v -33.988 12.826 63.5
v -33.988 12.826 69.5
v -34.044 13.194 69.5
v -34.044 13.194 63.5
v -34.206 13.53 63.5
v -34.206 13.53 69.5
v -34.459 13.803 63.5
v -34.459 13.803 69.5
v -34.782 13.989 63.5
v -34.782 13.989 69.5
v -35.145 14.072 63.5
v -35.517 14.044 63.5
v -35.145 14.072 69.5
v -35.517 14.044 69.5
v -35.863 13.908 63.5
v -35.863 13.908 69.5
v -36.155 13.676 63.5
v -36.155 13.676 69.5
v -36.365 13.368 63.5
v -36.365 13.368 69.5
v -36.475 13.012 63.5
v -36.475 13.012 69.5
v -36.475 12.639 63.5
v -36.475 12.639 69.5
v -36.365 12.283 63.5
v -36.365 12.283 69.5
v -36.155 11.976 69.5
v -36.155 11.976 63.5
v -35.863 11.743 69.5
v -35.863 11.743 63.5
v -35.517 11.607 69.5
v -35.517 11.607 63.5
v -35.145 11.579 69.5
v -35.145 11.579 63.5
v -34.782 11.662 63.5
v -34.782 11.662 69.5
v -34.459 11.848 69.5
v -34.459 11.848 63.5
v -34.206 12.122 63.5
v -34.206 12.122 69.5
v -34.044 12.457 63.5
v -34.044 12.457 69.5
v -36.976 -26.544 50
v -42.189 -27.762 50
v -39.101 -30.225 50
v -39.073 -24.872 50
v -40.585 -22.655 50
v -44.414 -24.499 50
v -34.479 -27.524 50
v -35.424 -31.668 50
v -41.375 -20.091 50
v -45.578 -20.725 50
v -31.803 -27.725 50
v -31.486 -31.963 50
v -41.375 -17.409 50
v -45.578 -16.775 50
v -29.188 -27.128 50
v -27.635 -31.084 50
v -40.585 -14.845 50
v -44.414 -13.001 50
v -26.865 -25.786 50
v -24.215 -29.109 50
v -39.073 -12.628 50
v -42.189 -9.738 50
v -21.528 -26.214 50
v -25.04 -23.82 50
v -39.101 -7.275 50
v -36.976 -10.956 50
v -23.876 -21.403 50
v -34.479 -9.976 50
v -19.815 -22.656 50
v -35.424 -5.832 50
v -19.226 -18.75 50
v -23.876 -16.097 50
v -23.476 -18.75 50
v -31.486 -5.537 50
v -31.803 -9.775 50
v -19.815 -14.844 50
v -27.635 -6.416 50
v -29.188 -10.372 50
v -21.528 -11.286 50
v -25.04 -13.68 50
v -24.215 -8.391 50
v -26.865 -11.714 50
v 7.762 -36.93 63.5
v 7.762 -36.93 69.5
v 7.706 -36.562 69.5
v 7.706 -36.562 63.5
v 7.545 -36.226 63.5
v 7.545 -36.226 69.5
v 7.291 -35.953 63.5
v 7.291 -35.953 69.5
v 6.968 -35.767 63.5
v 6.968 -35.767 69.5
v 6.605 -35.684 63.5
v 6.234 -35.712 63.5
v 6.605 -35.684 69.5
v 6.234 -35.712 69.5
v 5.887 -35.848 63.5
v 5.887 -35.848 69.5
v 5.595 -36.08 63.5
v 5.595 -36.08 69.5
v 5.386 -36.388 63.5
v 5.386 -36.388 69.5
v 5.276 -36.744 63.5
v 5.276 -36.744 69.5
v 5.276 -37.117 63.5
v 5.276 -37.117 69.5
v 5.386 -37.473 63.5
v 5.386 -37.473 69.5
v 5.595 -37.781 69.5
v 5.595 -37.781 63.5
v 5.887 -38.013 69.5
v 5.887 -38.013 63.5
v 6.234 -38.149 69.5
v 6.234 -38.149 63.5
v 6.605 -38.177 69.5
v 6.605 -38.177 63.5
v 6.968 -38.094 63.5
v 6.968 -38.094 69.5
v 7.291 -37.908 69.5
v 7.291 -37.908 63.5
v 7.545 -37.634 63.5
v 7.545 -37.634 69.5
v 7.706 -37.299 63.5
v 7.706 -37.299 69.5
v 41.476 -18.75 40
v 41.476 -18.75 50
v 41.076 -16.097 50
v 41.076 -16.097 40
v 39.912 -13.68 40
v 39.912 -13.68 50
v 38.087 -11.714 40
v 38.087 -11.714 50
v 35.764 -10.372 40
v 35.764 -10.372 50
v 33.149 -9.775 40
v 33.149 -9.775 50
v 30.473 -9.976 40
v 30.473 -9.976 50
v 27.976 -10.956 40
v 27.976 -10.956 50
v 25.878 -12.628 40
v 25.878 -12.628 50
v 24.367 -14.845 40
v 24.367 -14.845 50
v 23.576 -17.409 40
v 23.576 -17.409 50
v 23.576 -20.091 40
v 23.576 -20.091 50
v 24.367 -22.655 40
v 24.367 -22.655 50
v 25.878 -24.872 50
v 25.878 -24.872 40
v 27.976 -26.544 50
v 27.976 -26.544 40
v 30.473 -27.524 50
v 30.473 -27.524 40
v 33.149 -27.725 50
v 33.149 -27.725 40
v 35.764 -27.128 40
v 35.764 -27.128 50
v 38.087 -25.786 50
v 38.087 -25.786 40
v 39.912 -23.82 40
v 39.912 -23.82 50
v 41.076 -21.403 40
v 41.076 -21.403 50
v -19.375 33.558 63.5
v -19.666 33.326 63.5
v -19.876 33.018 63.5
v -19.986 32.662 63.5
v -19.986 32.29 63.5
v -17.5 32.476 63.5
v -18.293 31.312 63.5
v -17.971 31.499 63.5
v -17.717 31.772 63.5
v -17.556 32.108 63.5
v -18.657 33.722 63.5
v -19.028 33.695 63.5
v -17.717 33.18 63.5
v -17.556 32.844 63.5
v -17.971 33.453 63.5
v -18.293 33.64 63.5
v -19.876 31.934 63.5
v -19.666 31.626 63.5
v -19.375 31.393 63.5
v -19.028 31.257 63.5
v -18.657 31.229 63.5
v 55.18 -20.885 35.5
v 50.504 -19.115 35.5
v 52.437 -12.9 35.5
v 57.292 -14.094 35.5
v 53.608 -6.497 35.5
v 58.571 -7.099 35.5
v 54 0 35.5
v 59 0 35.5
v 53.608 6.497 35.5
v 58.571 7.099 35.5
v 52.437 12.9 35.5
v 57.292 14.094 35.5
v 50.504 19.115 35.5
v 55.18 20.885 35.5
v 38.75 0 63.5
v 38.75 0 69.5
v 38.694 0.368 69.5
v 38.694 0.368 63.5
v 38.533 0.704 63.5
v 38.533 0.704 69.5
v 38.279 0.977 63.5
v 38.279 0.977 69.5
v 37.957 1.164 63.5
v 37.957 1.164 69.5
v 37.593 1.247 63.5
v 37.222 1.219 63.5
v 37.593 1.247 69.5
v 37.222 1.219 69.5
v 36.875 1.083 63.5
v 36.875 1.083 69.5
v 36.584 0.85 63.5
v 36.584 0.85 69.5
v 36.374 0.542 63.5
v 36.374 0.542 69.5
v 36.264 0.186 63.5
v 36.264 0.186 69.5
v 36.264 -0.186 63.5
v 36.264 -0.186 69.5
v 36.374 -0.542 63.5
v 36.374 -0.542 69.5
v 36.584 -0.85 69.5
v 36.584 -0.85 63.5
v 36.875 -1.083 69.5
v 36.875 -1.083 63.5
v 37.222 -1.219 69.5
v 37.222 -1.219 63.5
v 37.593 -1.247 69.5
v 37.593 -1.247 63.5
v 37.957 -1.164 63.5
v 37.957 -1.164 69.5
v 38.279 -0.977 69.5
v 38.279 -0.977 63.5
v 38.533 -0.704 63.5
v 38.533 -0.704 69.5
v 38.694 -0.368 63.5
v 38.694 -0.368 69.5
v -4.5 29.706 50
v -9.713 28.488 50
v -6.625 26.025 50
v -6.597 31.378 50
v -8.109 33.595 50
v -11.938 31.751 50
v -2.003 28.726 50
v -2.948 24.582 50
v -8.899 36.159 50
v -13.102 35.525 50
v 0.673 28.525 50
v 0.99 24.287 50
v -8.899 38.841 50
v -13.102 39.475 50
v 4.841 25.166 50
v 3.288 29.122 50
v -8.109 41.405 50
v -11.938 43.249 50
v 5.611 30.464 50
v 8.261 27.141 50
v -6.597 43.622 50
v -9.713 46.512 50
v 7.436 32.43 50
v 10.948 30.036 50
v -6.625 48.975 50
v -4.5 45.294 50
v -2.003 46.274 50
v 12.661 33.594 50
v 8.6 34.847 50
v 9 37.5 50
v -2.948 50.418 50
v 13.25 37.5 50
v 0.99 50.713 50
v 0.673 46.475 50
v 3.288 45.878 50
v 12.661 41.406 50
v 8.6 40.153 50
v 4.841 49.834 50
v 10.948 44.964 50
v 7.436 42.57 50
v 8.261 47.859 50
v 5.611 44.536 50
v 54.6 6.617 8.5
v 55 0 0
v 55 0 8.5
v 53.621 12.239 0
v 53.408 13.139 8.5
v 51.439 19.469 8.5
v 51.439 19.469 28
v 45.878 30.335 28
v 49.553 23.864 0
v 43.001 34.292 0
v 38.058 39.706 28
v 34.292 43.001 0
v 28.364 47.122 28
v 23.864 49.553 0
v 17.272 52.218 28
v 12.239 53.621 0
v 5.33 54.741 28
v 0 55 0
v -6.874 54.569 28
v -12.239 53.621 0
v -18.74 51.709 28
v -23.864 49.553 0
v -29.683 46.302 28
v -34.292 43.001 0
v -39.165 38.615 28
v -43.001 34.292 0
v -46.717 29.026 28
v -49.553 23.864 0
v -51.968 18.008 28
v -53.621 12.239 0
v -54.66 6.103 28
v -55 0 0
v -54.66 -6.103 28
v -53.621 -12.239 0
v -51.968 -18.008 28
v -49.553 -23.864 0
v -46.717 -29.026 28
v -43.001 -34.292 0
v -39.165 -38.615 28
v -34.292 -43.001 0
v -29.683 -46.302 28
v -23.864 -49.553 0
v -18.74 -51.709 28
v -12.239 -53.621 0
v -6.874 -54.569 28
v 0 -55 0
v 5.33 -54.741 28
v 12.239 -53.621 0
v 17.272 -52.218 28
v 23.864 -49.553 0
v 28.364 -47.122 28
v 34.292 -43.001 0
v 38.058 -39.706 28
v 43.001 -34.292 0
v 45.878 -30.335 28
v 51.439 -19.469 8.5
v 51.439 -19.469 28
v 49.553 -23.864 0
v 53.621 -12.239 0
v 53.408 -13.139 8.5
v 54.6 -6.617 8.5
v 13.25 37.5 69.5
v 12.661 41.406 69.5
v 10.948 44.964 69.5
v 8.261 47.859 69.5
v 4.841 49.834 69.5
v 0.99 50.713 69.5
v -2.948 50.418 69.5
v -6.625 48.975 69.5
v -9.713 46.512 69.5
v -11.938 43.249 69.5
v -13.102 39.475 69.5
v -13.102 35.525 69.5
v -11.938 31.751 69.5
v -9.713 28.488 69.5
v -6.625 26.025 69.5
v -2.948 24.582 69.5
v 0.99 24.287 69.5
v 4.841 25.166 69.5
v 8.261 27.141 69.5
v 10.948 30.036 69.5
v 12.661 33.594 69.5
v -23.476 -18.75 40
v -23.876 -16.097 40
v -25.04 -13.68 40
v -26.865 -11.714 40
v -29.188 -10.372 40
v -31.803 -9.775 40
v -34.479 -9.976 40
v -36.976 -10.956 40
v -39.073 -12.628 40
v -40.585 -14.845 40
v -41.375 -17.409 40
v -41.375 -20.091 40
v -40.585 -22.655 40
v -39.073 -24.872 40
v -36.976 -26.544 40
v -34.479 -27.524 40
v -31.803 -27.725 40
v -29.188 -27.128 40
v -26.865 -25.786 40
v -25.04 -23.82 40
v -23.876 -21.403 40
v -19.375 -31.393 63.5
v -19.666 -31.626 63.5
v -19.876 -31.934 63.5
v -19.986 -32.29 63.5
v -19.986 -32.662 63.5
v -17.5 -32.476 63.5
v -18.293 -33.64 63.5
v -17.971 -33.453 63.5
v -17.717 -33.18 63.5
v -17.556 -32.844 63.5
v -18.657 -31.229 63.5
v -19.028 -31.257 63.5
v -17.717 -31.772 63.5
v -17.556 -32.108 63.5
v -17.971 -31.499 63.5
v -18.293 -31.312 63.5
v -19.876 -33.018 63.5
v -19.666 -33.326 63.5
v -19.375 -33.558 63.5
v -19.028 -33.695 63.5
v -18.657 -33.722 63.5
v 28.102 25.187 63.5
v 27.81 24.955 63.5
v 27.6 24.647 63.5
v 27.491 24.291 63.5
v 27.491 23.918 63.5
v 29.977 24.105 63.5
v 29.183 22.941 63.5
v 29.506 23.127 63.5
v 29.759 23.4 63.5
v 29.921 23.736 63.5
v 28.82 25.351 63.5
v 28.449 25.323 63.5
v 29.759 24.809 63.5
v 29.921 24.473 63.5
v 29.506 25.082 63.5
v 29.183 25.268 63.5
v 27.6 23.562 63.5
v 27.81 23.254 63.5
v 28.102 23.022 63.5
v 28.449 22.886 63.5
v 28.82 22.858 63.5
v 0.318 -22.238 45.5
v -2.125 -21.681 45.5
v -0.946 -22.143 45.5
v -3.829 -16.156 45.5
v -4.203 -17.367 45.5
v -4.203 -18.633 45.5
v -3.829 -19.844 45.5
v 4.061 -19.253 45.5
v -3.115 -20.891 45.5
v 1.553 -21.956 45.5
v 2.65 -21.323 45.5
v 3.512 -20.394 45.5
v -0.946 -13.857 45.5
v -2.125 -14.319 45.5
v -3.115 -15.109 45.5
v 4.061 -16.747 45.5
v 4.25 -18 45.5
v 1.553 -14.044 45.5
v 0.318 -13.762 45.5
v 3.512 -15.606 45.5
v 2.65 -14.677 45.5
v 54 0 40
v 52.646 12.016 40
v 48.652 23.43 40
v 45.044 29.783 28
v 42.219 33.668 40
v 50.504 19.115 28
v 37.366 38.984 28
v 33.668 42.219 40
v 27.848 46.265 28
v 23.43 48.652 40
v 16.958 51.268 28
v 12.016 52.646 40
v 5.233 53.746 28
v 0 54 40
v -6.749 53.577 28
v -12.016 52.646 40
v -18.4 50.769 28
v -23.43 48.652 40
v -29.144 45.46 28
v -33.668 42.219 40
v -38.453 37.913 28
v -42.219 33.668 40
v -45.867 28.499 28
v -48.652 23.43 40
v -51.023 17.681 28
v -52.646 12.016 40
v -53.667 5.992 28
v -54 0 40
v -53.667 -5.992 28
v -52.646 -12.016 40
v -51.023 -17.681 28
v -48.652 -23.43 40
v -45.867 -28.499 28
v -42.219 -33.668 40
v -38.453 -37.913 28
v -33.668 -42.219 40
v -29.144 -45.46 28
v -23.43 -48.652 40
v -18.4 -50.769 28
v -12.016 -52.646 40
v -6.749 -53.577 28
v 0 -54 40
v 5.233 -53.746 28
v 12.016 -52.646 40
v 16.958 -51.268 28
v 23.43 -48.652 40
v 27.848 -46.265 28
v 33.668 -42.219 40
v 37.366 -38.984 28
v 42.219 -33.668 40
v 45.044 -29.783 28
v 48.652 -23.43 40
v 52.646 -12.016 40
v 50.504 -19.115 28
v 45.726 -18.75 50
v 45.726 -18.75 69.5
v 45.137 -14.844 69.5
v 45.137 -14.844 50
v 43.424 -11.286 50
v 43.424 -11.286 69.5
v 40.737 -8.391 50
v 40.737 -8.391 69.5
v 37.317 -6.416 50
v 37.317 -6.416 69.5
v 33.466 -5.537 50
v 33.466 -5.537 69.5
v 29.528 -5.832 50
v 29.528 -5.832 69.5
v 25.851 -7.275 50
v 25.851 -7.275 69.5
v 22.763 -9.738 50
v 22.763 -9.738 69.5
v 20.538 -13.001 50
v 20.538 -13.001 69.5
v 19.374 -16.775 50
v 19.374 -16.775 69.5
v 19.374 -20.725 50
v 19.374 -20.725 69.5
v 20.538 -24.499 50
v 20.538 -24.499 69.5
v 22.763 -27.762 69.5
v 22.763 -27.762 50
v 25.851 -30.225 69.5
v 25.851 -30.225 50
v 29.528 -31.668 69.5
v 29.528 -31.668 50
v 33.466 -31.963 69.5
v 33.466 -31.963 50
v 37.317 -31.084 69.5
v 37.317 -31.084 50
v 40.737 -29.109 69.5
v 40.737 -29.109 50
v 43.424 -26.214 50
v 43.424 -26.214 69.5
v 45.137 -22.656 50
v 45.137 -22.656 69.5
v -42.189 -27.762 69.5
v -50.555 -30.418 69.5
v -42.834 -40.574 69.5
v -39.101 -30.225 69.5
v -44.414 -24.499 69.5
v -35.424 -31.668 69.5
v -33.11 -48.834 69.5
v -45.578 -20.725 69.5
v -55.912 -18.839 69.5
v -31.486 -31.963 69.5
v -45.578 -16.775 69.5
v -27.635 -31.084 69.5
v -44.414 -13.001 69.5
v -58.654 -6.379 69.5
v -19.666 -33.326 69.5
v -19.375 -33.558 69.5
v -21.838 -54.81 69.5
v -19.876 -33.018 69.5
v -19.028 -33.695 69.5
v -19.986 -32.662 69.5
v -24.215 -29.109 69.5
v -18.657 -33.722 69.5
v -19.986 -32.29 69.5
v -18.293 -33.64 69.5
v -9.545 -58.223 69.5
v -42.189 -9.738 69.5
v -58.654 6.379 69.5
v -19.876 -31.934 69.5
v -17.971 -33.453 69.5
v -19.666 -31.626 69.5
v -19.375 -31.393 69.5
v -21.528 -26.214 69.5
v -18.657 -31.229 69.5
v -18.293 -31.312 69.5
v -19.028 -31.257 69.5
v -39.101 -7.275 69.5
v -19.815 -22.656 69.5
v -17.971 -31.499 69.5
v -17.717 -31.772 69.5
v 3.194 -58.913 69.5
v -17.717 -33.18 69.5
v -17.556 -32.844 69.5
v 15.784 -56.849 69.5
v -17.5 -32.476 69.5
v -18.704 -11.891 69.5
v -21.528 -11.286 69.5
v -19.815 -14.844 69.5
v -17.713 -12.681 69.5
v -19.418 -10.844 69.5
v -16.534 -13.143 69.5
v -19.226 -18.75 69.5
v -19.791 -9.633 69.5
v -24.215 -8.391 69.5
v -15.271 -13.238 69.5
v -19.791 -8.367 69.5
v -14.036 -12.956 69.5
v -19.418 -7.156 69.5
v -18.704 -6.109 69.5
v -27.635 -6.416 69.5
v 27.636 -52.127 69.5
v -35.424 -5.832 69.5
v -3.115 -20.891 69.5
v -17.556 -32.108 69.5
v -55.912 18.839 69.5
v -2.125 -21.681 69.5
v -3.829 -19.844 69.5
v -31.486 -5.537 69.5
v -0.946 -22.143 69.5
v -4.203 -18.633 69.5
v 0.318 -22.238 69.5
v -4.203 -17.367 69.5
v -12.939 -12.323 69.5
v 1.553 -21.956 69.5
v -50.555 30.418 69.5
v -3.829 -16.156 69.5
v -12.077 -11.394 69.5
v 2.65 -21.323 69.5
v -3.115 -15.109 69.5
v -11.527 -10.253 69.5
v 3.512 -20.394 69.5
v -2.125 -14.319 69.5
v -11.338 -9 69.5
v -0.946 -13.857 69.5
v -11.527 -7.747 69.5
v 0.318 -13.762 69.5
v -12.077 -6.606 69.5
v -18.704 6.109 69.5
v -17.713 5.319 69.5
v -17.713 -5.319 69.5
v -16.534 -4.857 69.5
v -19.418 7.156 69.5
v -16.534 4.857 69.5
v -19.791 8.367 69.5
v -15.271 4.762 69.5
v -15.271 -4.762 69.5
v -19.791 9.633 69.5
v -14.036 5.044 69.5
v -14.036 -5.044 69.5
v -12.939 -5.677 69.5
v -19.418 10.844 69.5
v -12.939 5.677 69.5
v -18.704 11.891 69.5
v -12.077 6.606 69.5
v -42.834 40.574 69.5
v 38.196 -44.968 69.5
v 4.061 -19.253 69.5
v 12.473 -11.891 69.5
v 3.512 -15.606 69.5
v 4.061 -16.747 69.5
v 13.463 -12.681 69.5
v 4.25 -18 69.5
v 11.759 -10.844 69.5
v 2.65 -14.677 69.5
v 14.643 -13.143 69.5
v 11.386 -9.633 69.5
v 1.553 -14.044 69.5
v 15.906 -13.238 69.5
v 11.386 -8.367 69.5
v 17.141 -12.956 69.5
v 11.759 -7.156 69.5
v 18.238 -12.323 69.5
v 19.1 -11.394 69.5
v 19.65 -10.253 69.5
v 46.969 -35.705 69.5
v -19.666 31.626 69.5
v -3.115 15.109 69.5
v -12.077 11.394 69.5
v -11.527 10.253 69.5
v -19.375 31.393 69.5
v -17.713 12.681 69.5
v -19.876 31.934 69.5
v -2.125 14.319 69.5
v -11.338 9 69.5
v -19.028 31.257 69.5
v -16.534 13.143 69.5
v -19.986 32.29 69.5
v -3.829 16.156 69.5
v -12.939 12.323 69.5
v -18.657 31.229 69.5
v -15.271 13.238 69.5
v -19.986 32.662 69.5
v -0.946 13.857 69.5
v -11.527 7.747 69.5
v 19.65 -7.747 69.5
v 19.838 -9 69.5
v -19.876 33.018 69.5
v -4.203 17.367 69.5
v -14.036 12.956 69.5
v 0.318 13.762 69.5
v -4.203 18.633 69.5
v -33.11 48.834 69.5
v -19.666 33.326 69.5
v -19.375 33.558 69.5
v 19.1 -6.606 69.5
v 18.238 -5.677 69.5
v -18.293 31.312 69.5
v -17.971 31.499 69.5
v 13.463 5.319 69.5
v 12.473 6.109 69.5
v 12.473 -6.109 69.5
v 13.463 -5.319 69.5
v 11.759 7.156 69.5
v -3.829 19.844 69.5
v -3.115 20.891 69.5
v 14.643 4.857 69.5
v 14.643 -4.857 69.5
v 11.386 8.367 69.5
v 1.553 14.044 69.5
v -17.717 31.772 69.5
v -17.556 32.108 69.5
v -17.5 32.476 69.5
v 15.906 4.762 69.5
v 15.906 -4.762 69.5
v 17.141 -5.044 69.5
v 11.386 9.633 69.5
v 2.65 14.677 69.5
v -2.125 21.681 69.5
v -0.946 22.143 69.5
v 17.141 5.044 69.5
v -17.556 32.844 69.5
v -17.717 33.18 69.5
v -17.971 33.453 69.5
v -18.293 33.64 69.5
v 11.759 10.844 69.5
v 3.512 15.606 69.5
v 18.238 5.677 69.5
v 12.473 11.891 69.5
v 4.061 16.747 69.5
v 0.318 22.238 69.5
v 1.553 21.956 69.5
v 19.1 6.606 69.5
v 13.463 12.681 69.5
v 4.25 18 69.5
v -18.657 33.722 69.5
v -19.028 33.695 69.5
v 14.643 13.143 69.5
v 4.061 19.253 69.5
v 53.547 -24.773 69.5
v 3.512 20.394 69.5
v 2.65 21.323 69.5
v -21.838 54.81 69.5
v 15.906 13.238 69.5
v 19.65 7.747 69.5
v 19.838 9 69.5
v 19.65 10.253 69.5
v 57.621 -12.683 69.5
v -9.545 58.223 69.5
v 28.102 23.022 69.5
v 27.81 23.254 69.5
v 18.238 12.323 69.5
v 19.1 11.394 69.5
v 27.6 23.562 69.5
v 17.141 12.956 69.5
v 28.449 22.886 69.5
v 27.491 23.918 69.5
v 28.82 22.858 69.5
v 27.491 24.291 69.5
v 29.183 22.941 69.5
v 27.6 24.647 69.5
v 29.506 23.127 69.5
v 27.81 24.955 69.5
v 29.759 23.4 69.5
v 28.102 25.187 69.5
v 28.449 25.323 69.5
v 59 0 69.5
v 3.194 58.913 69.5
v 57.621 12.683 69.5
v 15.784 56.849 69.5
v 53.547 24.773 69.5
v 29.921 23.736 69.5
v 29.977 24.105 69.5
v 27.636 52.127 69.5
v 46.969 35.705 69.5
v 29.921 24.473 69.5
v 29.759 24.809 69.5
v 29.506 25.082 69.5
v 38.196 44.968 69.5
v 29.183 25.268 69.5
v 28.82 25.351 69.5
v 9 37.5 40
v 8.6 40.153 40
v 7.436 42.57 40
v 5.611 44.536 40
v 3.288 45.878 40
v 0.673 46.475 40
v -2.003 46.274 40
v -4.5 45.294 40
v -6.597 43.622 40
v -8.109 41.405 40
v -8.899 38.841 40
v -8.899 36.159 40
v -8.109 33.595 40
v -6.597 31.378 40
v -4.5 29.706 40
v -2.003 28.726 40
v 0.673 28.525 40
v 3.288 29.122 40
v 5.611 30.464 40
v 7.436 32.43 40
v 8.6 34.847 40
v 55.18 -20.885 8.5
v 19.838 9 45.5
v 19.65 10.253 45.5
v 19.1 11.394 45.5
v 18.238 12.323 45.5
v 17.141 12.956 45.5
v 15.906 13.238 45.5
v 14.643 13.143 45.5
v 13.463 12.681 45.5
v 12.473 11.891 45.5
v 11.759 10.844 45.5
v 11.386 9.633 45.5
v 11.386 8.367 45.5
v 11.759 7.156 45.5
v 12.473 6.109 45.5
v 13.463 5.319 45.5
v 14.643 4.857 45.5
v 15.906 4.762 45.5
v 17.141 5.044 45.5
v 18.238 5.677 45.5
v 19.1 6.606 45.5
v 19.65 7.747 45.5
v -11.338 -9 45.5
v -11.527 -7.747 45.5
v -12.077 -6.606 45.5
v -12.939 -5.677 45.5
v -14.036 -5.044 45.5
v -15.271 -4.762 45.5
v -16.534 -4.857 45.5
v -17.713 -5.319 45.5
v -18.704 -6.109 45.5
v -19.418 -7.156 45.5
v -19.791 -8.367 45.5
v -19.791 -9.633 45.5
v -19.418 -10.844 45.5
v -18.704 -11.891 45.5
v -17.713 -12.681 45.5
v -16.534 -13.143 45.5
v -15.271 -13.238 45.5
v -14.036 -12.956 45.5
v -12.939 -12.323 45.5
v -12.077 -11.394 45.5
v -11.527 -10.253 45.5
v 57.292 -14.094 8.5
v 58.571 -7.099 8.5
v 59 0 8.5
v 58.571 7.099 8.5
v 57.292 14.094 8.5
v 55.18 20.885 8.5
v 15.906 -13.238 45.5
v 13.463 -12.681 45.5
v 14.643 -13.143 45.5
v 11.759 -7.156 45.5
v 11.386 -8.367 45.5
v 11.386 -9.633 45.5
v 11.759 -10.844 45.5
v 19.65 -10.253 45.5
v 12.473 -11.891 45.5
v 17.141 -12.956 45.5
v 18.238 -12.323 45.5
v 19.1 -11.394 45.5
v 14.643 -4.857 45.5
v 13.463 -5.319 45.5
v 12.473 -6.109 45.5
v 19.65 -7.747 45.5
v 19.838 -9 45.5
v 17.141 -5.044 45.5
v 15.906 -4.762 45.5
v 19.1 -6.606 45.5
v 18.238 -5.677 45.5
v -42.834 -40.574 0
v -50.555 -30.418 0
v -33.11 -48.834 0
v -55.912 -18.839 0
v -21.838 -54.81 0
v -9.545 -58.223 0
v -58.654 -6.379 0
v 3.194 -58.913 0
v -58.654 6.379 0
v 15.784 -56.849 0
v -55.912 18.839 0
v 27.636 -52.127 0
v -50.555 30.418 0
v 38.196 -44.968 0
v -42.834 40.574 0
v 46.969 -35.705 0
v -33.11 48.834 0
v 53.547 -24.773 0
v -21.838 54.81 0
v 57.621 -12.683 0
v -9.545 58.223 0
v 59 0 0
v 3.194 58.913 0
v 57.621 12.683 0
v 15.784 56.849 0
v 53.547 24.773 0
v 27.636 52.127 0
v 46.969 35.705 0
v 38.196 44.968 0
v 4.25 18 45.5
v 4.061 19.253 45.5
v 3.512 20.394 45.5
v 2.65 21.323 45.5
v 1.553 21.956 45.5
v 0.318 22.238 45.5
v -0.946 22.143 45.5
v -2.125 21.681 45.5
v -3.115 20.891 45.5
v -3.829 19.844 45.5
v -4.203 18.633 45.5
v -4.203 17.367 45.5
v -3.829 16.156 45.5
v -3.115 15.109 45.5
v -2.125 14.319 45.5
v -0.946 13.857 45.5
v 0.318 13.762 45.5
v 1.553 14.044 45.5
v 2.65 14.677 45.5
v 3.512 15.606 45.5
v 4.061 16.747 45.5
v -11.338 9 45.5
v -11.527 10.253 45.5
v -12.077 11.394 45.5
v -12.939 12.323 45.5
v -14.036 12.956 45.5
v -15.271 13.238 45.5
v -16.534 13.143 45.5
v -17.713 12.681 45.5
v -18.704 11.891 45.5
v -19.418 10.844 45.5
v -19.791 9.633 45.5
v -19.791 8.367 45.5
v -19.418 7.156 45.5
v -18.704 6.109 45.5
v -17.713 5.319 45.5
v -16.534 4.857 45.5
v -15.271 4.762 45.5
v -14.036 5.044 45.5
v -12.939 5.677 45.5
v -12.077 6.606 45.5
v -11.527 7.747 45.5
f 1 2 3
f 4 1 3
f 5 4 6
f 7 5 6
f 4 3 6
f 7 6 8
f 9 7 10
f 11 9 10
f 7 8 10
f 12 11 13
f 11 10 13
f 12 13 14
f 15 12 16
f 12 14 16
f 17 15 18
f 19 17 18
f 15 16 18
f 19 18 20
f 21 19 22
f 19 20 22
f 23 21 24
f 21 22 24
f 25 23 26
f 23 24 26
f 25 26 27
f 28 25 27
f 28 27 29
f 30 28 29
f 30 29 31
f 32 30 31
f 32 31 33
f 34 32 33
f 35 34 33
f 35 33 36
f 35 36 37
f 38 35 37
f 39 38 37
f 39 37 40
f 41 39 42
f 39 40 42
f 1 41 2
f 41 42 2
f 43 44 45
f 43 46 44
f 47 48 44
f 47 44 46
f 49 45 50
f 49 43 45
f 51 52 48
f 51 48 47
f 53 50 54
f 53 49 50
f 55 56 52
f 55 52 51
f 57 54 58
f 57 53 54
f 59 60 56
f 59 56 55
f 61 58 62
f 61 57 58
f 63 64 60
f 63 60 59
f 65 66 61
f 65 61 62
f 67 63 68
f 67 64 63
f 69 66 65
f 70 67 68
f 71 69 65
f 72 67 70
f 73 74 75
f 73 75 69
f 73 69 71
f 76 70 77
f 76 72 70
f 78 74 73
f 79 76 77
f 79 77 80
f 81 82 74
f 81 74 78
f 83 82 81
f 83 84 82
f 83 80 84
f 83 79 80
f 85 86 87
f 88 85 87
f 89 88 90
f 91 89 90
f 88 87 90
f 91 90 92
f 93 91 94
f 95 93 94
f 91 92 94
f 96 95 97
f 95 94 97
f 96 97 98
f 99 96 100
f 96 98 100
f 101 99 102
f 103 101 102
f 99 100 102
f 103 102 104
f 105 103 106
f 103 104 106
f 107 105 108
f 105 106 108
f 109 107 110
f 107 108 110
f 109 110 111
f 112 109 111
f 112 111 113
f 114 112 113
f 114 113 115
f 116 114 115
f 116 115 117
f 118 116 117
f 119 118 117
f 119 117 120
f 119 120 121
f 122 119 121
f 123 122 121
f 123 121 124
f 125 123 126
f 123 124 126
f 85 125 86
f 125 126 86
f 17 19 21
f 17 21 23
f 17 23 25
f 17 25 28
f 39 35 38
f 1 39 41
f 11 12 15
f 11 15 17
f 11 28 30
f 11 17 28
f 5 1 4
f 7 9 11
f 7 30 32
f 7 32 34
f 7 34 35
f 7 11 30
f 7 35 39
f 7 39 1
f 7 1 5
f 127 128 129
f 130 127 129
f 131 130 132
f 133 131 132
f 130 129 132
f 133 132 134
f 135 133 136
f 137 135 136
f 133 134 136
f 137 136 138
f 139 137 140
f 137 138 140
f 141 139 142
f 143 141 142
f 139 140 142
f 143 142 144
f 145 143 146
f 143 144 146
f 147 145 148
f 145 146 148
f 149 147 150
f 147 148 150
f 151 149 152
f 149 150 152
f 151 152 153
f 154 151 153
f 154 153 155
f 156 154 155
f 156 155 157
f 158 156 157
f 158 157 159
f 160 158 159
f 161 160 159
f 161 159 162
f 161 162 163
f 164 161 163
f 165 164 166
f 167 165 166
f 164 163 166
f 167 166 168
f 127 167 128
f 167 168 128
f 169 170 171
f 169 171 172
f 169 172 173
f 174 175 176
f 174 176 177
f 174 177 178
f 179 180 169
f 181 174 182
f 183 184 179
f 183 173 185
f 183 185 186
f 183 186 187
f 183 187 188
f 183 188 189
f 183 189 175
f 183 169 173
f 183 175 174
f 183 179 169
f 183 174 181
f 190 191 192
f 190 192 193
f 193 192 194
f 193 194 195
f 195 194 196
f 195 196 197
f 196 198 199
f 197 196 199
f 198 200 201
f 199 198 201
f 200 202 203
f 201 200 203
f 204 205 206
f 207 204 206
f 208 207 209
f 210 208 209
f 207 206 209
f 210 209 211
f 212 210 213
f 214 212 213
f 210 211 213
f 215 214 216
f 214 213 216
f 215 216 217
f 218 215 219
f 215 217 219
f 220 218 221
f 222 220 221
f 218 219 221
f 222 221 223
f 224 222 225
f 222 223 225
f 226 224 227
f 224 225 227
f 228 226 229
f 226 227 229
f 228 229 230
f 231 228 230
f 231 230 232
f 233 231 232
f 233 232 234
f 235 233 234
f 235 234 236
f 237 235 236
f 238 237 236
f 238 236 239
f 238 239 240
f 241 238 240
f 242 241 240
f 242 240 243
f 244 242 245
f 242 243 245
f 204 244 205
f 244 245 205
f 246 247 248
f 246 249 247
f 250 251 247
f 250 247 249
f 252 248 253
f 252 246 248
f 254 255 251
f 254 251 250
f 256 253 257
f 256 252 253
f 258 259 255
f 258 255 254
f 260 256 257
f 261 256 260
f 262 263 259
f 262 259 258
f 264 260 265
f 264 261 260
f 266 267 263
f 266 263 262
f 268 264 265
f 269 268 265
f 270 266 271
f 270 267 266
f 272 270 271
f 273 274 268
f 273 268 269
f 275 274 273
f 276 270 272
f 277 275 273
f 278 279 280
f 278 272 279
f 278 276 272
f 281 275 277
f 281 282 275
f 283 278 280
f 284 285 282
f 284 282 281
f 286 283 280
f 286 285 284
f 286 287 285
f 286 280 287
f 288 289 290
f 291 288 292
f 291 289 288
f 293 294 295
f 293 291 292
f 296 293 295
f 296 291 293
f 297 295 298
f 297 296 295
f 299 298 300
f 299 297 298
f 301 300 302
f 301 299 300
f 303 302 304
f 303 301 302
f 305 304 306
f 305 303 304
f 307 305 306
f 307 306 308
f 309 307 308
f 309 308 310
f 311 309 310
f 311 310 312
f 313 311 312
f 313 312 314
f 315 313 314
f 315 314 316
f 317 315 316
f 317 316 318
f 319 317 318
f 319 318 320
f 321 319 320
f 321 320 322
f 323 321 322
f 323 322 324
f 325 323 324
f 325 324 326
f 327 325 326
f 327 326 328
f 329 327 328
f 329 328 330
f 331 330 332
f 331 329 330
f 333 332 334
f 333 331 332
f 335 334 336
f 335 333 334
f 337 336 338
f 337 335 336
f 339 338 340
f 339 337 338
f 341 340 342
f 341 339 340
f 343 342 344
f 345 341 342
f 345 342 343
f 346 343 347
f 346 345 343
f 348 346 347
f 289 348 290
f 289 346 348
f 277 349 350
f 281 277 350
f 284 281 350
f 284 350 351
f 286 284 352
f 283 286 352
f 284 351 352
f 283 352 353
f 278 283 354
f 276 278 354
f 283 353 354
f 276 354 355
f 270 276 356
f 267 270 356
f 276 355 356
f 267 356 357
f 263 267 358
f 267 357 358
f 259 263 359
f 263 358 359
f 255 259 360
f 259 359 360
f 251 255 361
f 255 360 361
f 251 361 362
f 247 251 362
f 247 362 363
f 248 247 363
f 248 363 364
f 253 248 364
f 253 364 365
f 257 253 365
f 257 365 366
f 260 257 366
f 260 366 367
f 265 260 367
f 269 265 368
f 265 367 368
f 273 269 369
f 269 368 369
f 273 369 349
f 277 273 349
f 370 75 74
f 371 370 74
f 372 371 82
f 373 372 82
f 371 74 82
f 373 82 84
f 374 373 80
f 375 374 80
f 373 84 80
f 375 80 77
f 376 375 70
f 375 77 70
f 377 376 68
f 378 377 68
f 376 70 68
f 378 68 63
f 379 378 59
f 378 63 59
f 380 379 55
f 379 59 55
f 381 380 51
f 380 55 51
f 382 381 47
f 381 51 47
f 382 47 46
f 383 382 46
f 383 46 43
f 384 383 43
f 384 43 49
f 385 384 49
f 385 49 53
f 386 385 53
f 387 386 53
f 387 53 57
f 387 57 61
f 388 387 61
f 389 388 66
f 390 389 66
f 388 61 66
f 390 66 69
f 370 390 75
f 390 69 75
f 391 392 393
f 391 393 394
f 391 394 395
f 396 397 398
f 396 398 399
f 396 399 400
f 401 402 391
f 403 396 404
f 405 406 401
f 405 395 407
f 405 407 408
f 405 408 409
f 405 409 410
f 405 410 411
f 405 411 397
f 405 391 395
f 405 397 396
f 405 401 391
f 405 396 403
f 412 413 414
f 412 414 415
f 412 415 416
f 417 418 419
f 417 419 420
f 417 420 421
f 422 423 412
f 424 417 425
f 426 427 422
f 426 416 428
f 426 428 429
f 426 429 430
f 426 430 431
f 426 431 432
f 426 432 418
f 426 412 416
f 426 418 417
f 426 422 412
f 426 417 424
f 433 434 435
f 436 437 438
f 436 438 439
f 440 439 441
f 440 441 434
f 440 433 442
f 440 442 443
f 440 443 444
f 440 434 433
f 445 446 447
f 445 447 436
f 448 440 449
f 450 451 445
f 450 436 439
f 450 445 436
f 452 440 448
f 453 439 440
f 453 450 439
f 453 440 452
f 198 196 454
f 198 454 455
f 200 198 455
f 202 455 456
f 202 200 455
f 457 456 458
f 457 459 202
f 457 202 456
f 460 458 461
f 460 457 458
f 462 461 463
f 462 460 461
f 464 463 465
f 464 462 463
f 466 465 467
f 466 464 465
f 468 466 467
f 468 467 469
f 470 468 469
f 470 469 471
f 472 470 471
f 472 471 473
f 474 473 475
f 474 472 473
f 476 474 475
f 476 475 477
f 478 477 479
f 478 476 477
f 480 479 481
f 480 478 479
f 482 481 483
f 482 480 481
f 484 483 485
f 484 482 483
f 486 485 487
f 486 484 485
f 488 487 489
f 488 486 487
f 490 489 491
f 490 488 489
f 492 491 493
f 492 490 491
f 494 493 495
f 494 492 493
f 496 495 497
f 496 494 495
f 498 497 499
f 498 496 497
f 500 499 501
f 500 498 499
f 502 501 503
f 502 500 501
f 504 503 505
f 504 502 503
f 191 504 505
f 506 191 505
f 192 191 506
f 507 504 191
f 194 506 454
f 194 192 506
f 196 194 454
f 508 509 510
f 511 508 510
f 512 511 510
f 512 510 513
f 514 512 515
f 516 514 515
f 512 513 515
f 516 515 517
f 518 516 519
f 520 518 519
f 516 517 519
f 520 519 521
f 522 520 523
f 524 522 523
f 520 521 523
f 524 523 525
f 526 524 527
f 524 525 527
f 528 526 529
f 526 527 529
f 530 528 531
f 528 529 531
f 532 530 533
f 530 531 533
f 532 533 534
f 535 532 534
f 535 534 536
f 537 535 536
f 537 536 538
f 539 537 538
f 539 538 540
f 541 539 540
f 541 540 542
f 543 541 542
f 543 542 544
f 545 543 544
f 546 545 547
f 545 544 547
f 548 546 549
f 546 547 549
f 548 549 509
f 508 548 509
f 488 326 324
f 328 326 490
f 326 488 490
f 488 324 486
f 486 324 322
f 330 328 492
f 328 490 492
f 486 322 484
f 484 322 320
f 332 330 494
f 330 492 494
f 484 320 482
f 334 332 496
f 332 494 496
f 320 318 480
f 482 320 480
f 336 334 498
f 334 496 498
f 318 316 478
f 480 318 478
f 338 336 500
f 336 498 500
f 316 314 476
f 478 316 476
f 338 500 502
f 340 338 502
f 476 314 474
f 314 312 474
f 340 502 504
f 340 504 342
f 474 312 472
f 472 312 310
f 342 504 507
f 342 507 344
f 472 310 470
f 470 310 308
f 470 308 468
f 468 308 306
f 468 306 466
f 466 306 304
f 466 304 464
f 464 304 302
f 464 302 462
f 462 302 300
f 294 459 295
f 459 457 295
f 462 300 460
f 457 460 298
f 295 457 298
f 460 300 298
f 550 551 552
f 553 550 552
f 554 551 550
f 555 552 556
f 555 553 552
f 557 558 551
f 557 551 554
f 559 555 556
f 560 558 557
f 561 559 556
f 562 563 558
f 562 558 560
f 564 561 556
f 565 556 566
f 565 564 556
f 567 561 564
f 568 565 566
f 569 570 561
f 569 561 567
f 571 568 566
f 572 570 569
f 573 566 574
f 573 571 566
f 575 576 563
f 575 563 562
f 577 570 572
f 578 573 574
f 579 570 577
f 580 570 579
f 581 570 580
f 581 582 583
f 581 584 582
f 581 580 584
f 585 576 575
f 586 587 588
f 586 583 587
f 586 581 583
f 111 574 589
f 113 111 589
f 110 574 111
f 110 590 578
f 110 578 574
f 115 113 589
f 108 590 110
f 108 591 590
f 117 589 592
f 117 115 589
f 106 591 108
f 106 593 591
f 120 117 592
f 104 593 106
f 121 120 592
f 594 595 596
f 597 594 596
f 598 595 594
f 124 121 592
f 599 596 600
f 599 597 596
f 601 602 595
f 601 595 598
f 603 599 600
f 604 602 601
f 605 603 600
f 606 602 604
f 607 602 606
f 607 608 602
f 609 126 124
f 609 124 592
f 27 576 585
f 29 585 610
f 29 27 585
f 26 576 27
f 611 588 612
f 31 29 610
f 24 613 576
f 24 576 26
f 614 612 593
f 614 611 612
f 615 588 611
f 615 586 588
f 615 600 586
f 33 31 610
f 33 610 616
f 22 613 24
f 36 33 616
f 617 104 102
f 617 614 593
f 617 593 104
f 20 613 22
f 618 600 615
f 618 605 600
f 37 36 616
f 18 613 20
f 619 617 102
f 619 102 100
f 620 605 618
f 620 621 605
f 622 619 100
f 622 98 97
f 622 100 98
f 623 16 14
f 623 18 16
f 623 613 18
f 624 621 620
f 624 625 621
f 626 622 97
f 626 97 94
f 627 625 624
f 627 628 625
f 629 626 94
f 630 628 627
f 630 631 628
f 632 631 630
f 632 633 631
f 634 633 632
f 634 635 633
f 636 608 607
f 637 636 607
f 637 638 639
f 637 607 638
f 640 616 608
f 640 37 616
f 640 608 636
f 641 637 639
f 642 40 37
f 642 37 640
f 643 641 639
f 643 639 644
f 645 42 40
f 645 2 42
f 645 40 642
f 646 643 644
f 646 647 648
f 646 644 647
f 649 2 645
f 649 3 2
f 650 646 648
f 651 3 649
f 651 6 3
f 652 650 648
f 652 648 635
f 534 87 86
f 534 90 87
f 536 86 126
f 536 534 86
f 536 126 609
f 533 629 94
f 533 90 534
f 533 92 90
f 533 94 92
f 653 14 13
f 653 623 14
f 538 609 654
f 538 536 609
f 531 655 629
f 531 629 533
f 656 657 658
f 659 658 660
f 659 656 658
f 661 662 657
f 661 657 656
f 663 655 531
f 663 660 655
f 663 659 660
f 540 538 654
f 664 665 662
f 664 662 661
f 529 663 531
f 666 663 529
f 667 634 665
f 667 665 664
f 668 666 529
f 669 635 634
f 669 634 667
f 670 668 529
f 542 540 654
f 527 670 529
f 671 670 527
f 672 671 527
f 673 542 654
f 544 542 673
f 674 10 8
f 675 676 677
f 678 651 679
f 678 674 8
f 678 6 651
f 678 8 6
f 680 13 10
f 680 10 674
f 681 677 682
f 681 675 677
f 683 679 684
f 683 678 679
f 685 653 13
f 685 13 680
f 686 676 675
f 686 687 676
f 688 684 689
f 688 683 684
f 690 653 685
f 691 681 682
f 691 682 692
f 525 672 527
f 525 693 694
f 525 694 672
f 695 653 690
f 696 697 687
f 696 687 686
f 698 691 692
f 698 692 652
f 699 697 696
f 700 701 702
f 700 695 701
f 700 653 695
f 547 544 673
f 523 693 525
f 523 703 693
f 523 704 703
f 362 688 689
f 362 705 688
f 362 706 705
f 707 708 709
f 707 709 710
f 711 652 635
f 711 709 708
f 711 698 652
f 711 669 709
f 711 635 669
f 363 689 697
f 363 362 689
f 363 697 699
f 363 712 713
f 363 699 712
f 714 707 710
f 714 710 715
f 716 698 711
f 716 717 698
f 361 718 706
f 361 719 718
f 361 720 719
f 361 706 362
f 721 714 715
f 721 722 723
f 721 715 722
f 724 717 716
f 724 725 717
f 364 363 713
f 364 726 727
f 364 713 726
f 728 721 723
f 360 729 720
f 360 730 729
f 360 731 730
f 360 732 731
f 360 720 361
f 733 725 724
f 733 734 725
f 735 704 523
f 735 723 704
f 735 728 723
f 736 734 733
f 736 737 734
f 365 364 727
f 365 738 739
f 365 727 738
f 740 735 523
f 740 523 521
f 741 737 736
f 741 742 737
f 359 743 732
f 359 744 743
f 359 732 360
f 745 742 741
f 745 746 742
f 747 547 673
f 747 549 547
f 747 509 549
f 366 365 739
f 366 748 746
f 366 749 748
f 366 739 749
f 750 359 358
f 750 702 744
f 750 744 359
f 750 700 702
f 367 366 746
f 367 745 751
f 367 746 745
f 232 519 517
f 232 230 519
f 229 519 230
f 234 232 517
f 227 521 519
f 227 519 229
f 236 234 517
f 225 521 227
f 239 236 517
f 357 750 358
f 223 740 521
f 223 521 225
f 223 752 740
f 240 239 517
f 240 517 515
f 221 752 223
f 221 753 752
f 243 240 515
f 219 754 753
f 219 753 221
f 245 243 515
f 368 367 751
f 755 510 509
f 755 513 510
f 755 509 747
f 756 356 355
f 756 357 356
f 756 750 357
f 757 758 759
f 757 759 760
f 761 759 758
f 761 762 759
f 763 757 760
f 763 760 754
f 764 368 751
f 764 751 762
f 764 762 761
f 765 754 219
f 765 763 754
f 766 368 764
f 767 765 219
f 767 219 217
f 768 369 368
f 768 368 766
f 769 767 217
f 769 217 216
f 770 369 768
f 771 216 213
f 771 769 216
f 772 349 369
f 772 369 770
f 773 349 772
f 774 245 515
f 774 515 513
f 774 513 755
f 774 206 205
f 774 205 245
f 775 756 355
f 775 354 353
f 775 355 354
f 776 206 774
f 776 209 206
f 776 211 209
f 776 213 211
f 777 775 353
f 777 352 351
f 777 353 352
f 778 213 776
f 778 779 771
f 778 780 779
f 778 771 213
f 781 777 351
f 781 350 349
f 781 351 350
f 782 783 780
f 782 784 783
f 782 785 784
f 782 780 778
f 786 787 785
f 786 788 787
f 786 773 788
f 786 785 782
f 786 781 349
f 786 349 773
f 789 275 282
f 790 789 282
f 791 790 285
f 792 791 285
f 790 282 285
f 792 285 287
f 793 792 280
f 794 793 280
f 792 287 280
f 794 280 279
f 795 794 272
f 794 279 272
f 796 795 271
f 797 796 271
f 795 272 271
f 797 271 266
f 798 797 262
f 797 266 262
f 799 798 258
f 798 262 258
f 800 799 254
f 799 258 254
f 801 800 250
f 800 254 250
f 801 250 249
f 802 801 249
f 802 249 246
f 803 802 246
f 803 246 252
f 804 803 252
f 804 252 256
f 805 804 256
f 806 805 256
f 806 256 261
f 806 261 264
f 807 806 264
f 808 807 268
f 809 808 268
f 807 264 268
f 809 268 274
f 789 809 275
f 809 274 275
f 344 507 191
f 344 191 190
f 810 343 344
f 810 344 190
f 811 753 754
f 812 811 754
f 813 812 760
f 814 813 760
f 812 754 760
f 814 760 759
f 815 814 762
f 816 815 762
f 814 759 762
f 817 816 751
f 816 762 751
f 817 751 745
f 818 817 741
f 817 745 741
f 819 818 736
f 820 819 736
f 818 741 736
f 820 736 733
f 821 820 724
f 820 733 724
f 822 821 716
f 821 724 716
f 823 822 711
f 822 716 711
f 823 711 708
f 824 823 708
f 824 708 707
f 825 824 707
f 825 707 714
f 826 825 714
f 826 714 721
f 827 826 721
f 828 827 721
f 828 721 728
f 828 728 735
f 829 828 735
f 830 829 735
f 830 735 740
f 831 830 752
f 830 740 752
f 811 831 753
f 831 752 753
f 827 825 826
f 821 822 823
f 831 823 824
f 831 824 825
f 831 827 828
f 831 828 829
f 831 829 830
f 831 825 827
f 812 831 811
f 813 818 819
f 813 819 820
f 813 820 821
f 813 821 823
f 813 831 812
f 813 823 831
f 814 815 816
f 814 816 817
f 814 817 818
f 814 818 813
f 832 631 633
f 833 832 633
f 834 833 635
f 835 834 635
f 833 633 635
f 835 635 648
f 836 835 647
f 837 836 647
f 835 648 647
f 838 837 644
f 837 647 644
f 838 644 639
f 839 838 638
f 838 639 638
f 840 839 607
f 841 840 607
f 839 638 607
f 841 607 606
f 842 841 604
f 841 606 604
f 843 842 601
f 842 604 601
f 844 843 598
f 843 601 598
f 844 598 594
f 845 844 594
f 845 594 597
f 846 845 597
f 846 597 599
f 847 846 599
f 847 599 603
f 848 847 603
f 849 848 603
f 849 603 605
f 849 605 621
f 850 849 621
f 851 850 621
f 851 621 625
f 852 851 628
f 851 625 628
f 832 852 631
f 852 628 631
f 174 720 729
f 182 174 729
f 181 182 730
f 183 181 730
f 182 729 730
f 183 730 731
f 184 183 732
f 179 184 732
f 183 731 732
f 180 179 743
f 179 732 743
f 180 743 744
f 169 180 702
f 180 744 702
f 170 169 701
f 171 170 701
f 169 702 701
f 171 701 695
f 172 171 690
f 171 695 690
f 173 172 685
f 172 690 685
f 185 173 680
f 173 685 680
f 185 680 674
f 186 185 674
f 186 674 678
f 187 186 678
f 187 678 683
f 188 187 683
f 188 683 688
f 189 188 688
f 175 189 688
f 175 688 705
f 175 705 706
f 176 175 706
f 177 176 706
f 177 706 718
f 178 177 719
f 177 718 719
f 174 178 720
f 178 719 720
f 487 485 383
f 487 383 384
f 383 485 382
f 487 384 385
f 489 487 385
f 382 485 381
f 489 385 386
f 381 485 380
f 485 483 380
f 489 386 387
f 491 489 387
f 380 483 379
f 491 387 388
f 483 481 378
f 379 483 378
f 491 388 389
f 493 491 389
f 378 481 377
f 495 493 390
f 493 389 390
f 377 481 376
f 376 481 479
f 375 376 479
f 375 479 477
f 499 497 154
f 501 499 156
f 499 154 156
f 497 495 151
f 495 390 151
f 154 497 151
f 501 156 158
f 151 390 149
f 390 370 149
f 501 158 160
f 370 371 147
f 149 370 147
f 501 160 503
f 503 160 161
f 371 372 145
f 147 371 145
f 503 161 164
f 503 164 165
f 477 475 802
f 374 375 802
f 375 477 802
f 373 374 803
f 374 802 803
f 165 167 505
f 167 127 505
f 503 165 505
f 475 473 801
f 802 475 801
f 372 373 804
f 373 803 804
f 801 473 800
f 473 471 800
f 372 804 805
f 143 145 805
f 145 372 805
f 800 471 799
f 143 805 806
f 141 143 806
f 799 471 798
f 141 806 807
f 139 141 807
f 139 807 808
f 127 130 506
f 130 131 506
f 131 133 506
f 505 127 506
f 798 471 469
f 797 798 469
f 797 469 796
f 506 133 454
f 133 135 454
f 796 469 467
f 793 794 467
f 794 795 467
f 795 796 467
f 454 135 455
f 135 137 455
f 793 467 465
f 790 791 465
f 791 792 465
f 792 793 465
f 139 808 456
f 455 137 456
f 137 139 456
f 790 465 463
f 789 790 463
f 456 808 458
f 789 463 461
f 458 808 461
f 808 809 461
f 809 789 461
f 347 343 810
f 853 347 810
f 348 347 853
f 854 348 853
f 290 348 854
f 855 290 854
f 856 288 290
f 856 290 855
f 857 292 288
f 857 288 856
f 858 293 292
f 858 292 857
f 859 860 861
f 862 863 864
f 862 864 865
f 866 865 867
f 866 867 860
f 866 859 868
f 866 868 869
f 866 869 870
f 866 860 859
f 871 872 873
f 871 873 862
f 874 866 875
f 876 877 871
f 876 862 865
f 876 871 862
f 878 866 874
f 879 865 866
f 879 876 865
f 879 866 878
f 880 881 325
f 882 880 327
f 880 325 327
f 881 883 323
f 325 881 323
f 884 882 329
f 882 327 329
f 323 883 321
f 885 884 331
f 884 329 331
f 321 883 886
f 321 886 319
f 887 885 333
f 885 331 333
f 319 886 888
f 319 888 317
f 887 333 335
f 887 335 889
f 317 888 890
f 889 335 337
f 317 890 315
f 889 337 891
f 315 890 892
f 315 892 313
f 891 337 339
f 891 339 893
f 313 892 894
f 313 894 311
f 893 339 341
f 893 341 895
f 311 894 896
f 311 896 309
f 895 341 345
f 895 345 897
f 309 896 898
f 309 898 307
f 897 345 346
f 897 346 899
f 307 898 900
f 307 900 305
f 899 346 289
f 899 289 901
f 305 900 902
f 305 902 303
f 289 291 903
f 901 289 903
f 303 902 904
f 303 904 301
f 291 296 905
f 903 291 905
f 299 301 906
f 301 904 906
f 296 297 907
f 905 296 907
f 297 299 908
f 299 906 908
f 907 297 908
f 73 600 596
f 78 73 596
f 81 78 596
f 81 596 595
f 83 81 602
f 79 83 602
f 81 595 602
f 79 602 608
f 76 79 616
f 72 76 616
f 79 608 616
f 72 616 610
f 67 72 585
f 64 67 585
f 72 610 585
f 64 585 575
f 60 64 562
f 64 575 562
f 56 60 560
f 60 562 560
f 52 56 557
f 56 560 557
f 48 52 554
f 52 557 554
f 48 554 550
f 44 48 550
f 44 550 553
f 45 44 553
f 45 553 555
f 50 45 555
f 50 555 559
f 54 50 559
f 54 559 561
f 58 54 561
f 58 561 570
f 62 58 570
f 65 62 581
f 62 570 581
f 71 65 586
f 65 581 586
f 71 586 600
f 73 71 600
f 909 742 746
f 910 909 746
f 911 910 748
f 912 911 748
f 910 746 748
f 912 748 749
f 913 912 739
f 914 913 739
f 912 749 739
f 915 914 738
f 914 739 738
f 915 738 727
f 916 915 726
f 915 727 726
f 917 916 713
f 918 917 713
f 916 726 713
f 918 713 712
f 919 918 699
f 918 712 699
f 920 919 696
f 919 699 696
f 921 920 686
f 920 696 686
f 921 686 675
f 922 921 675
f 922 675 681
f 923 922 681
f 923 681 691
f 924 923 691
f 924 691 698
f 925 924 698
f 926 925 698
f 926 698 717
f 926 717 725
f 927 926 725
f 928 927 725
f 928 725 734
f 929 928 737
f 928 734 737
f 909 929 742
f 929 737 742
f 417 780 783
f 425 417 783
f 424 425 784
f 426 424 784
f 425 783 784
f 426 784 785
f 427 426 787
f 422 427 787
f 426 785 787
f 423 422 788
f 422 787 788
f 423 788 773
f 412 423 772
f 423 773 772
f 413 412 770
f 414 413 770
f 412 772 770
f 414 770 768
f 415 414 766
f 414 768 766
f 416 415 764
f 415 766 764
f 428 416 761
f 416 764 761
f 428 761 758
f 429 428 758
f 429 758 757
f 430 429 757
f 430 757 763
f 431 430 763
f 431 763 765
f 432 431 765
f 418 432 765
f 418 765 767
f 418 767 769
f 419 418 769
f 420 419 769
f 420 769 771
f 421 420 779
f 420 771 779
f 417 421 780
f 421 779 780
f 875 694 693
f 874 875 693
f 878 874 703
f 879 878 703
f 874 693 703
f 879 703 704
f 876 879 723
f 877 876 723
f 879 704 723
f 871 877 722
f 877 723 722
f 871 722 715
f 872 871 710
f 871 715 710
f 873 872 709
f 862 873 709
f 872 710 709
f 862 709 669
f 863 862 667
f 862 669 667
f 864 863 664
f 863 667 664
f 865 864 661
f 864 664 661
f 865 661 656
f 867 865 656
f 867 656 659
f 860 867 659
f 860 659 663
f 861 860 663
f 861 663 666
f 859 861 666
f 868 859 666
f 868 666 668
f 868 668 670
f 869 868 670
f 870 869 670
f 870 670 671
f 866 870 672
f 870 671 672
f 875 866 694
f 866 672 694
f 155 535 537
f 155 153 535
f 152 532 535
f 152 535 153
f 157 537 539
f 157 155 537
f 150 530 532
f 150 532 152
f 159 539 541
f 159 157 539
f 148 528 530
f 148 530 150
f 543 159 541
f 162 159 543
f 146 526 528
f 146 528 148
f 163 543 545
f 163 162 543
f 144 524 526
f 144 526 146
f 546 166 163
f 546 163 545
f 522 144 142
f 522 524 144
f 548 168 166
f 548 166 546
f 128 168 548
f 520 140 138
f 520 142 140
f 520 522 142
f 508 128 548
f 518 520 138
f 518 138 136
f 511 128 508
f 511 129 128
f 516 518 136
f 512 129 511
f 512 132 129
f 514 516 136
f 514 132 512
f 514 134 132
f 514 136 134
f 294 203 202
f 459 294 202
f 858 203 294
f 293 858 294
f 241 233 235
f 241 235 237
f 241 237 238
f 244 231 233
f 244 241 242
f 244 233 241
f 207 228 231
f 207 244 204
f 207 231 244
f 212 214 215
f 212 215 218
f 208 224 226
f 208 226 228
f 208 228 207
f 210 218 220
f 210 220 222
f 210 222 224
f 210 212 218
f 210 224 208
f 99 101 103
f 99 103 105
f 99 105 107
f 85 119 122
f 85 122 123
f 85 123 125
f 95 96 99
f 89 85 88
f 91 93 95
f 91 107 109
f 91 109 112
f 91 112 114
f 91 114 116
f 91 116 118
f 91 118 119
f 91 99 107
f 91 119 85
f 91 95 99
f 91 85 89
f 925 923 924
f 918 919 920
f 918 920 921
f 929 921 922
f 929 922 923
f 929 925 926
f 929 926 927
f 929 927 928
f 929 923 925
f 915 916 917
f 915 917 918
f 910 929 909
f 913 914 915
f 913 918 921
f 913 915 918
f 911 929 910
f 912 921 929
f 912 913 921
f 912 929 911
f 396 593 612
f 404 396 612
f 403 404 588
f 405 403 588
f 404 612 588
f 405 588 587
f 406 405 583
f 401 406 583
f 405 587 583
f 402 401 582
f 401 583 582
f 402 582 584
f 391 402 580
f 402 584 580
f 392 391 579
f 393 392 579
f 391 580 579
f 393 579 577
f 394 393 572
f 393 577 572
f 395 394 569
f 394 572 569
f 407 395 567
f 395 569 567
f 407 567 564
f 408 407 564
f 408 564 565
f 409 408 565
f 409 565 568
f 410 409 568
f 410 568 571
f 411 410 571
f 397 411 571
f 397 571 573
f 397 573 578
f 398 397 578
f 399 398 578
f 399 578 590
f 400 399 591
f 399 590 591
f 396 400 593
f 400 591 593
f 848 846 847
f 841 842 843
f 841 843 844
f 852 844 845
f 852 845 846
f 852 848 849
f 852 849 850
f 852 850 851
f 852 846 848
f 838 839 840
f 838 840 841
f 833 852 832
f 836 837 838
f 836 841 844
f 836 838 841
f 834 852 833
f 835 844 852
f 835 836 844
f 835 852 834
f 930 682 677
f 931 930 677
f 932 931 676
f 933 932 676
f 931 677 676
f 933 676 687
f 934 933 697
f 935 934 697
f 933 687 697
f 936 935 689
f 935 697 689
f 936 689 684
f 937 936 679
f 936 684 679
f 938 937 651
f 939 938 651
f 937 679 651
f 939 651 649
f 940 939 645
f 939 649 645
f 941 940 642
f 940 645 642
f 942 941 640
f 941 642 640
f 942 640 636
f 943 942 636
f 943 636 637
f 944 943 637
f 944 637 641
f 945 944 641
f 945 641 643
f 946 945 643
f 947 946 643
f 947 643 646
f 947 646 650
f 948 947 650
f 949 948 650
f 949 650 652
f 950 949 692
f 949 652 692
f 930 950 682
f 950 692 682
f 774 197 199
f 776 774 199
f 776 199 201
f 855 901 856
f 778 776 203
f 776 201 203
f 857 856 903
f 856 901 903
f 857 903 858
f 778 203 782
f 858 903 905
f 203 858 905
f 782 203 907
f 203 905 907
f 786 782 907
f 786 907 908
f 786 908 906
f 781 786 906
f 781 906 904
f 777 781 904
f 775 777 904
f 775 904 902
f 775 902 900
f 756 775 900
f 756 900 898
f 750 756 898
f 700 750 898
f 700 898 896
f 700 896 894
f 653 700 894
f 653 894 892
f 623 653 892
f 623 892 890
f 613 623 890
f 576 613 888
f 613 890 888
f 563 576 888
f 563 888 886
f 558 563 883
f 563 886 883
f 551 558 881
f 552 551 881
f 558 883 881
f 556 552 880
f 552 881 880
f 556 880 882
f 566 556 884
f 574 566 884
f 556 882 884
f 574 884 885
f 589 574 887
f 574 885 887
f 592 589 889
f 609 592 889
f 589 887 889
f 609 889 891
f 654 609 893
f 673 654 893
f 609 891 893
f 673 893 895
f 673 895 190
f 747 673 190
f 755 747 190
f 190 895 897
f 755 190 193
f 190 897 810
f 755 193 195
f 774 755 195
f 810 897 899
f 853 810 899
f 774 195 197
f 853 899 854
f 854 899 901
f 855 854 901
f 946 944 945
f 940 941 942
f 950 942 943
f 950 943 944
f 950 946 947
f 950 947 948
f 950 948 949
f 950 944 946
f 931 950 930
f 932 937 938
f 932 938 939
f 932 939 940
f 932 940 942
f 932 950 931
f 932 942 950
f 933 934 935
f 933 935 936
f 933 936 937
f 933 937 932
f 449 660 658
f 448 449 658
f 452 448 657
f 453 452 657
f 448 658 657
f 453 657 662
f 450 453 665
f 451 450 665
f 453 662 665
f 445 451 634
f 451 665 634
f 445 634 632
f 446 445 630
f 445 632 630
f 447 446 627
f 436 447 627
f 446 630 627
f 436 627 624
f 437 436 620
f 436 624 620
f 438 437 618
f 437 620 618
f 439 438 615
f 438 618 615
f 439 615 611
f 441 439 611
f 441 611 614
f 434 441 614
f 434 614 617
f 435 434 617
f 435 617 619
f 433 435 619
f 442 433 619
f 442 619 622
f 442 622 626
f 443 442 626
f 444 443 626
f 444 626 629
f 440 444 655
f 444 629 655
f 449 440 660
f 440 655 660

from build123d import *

# Parameters (mm, degrees)
SKETCH_1_R               = 59
F_01_BODY_D118_DEPTH     = 69.5
SKETCH_2_R               = 55
F_02_BORE_D110_DEPTH     = 28
SKETCH_3_R               = 54
F_03_BORE_D108_DEPTH     = 12
SKETCH_4_R               = 4.25
F_04_HOLES_6_D8_5_DEPTH  = 24
SKETCH_5_R               = 13.25
F_05_LOBES_3_D26_5_DEPTH = 19.5
SKETCH_6_R               = 9
F_06_THRU_3_D18_DEPTH    = 10
F_07_WINDOW_27X40_DEPTH  = 27
SKETCH_8_R               = 1.25
F_08_TAP_9_M3_DEPTH      = 6


with BuildPart() as part:
    # 草图1 → 01_BODY_D118 (new body)
    with BuildSketch(Plane.XY):
        Circle(SKETCH_1_R)
    extrude(amount=F_01_BODY_D118_DEPTH)

    # 草图2 → 02_BORE_D110 (cut)
    with BuildSketch(Plane.XY):
        Circle(SKETCH_2_R)
    extrude(amount=F_02_BORE_D110_DEPTH, mode=Mode.SUBTRACT)

    # 草图3 → 03_BORE_D108 (cut)
    with BuildSketch(Plane.XY.offset(28)):
        Circle(SKETCH_3_R)
    extrude(amount=F_03_BORE_D108_DEPTH, mode=Mode.SUBTRACT)

    # 草图4 → 04_HOLES_6_D8.5 (cut)
    with BuildSketch(Plane.XY.offset(69.5)):
        with Locations((15.588457268, 9)):
            Circle(SKETCH_4_R)
        with Locations((0, 18)):
            Circle(SKETCH_4_R)
        with Locations((-15.588457268, 9)):
            Circle(SKETCH_4_R)
        with Locations((-15.588457268, -9)):
            Circle(SKETCH_4_R)
        with Locations((0, -18)):
            Circle(SKETCH_4_R)
        with Locations((15.588457268, -9)):
            Circle(SKETCH_4_R)
    extrude(amount=-F_04_HOLES_6_D8_5_DEPTH, mode=Mode.SUBTRACT)

    # 草图5 → 05_LOBES_3_D26.5 (cut)
    with BuildSketch(Plane.XY.offset(69.5)):
        with Locations((0, 37.5)):
            Circle(SKETCH_5_R)
        with Locations((-32.475952642, -18.75)):
            Circle(SKETCH_5_R)
        with Locations((32.475952642, -18.75)):
            Circle(SKETCH_5_R)
    extrude(amount=-F_05_LOBES_3_D26_5_DEPTH, mode=Mode.SUBTRACT)

    # 草图6 → 06_THRU_3_D18 (cut)
    with BuildSketch(Plane.XY.offset(50)):
        with Locations((0, 37.5)):
            Circle(SKETCH_6_R)
        with Locations((-32.475952642, -18.75)):
            Circle(SKETCH_6_R)
        with Locations((32.475952642, -18.75)):
            Circle(SKETCH_6_R)
    extrude(amount=-F_06_THRU_3_D18_DEPTH, mode=Mode.SUBTRACT)

    # 草图7 → 07_WINDOW_27X40 (cut)
    with BuildSketch(Plane.XY.offset(8.5)):
        with BuildLine():
            Line((55.179875165, 20.884955752), (50.503614558, 19.115044248))
            ThreePointArc((50.503614558, 19.115044248), (54, 0), (50.503614558, -19.115044248))
            Line((50.503614558, -19.115044248), (55.179875165, -20.884955752))
            ThreePointArc((55.179875165, -20.884955752), (59, 0), (55.179875165, 20.884955752))
        make_face()
    extrude(amount=F_07_WINDOW_27X40_DEPTH, mode=Mode.SUBTRACT)

    # 草图8 → 08_TAP_9_M3 (cut)
    with BuildSketch(Plane.XY.offset(69.5)):
        with Locations((-18.75, 32.475952642)):
            Circle(SKETCH_8_R)
        with Locations((-35.238473279, 12.825755375)):
            Circle(SKETCH_8_R)
        with Locations((-35.238473279, -12.825755375)):
            Circle(SKETCH_8_R)
        with Locations((-18.75, -32.475952642)):
            Circle(SKETCH_8_R)
        with Locations((6.511806663, -36.930290738)):
            Circle(SKETCH_8_R)
        with Locations((28.726666617, -24.104535363)):
            Circle(SKETCH_8_R)
        with Locations((37.5, 0)):
            Circle(SKETCH_8_R)
        with Locations((28.726666617, 24.104535363)):
            Circle(SKETCH_8_R)
        with Locations((6.511806663, 36.930290738)):
            Circle(SKETCH_8_R)
    extrude(amount=-F_08_TAP_9_M3_DEPTH, mode=Mode.SUBTRACT)


solid = part.part
